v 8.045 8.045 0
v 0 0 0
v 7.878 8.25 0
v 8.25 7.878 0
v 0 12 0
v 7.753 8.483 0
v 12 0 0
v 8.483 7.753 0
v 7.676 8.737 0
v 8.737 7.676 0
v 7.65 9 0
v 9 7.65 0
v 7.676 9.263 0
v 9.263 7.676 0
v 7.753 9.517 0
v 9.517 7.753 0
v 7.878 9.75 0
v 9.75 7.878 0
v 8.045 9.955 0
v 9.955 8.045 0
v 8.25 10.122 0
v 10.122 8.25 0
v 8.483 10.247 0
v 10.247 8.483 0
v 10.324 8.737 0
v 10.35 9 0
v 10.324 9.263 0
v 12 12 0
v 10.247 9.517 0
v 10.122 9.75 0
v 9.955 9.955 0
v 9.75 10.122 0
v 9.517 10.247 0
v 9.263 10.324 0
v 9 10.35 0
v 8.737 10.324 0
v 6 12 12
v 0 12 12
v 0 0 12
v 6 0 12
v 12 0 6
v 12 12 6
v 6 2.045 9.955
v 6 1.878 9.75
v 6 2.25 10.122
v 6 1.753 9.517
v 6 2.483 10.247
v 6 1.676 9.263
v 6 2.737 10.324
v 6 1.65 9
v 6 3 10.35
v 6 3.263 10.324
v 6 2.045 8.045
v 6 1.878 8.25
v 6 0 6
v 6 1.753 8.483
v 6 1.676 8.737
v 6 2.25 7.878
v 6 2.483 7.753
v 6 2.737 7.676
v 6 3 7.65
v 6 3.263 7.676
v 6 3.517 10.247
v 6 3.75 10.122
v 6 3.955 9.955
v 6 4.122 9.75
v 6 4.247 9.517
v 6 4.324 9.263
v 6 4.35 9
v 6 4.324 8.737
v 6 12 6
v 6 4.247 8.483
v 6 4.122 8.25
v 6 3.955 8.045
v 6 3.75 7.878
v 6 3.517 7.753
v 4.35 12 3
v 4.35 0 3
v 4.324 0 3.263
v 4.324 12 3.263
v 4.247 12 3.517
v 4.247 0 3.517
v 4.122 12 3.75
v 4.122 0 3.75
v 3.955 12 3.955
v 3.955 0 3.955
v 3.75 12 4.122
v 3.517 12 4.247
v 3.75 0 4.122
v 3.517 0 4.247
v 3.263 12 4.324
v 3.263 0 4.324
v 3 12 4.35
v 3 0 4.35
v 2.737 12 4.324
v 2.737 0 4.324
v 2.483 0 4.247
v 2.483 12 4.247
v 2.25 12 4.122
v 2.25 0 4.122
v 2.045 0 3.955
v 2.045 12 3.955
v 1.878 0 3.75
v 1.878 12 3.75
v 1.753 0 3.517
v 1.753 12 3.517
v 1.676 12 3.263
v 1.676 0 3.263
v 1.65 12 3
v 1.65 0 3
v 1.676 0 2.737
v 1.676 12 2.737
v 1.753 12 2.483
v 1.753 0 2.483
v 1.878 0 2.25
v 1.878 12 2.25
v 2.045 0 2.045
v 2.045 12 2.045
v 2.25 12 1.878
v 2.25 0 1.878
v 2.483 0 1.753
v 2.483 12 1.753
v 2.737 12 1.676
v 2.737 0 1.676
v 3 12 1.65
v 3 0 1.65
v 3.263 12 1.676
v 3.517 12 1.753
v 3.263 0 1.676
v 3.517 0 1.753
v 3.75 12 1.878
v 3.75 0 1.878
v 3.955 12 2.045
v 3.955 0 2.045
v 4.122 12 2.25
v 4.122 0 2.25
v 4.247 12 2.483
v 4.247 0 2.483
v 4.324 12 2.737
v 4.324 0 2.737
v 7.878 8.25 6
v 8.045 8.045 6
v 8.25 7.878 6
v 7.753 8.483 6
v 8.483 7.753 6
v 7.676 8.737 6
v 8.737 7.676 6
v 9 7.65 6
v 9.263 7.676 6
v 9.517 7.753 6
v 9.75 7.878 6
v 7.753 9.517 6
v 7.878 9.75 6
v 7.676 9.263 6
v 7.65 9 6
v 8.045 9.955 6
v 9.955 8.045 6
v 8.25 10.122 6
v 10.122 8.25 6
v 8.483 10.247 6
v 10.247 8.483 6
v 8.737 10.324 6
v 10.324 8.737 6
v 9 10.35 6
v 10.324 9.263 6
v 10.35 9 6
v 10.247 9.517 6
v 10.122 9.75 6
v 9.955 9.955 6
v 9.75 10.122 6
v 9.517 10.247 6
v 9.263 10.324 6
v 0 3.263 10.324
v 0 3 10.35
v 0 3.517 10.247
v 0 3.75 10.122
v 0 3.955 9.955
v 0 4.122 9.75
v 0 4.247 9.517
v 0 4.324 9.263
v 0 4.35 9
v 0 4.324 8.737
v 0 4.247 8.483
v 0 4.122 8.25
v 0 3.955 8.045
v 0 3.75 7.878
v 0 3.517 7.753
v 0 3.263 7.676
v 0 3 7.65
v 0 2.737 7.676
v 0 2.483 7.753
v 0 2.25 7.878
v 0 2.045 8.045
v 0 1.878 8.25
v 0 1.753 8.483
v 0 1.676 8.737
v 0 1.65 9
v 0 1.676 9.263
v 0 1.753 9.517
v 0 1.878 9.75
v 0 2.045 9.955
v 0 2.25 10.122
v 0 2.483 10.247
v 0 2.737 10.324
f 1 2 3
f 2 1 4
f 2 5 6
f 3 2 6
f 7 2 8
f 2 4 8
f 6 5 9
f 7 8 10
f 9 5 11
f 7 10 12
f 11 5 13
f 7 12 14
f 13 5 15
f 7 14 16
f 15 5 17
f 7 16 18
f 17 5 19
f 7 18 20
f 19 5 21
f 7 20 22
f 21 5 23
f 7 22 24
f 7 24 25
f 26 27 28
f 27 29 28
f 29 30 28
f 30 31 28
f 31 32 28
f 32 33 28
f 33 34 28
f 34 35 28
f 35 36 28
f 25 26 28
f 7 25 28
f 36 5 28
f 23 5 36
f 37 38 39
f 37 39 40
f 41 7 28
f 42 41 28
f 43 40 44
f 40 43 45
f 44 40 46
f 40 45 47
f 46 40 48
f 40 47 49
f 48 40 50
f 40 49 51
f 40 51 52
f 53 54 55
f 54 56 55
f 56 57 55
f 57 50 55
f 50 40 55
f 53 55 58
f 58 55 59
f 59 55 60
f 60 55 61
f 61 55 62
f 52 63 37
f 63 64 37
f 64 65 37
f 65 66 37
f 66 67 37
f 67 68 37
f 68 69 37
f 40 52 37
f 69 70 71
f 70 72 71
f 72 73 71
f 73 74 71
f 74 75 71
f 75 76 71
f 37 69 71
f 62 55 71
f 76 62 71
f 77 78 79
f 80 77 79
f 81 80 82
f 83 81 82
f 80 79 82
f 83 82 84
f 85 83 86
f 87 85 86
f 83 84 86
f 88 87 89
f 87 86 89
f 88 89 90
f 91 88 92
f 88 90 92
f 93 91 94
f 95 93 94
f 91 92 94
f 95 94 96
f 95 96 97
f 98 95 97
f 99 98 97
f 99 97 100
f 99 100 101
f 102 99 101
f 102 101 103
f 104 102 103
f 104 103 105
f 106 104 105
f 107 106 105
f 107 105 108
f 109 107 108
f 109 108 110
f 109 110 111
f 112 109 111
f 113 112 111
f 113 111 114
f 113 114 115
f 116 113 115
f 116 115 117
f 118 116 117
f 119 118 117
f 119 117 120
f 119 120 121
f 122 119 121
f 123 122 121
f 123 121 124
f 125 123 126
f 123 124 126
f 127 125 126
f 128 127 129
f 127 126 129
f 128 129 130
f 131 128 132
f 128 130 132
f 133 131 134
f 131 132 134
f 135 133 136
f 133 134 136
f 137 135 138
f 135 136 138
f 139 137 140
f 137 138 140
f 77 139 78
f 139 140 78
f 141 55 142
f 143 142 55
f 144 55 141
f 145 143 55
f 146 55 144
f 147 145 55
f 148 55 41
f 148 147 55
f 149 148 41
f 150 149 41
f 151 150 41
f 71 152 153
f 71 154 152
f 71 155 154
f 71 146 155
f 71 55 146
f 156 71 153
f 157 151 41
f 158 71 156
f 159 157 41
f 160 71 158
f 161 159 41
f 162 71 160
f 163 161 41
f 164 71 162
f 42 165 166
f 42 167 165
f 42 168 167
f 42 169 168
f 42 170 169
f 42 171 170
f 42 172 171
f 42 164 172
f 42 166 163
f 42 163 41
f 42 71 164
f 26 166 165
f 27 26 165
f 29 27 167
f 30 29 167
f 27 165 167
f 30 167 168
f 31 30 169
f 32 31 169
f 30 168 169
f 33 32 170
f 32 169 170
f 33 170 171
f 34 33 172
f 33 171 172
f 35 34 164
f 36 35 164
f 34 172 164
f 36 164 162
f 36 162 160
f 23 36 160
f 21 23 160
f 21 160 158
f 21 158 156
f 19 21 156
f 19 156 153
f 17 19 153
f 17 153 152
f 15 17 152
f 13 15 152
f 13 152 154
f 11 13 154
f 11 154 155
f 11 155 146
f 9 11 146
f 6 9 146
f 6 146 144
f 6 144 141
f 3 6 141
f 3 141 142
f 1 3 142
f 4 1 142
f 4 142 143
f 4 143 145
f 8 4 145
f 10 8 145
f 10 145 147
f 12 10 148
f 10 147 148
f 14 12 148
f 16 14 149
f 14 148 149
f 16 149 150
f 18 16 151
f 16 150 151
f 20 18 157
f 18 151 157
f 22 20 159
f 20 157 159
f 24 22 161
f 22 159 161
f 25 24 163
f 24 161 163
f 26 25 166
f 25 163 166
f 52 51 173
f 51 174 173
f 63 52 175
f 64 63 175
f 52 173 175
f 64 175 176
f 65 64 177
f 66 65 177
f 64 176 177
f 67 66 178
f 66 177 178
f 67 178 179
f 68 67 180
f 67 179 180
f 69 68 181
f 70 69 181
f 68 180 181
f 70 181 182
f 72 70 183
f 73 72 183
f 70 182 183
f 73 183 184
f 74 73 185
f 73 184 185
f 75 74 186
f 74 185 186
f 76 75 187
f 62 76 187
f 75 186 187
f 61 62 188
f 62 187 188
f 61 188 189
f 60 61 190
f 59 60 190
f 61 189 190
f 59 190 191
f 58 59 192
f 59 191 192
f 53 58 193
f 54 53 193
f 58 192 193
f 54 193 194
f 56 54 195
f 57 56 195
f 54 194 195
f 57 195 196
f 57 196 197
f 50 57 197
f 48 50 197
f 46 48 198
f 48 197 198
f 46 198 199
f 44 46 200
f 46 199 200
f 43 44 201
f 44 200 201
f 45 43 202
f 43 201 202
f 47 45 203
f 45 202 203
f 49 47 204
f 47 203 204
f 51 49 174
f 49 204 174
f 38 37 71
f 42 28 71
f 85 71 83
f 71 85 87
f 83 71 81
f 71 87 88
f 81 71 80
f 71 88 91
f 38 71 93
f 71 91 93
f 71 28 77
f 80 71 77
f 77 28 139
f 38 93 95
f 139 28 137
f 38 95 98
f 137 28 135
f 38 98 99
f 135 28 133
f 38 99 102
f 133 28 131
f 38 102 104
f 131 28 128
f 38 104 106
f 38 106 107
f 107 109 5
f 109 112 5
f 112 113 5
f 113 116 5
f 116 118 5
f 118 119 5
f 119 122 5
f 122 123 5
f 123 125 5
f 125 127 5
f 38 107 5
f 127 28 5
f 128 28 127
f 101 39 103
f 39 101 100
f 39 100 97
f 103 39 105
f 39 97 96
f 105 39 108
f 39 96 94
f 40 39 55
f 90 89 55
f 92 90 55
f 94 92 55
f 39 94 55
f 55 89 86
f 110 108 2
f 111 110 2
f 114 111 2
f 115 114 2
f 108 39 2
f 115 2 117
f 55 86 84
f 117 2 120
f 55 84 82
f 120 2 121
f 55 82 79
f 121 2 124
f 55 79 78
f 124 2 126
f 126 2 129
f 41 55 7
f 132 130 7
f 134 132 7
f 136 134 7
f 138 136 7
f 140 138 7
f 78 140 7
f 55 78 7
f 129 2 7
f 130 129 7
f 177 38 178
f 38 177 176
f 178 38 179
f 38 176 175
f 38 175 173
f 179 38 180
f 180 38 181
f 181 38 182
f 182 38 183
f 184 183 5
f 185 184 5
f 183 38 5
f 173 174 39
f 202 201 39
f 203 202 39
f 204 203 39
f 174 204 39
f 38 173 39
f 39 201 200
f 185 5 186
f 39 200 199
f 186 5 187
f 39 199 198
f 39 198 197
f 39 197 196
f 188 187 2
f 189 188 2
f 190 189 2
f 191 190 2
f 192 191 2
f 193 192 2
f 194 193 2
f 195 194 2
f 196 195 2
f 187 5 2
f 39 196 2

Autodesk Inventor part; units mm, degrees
ref_plane "YZ Plane" through (0, 0, 0) normal (1, 0, 0) x (0, 1, 0)
ref_plane "XZ Plane" through (0, 0, 0) normal (0, 1, 0) x (-1, 0, 0)
ref_plane "XY Plane" through (0, 0, 0) normal (0, 0, 1) x (1, 0, 0)
sketch "스케치1" plane through (0, 0, 0) normal (0, 0, 1) x (1, 0, 0)
  line L0 (0, 0) -> (12, 0)
  line L1 (12, 0) -> (12, 12)
  line L2 (12, 12) -> (0, 12)
  line L3 (0, 12) -> (0, 0)
  dimension "d0" = 12
  dimension "d1" = 12
extrude "돌출1" add sketch "스케치1" along normal blind 6
sketch "스케치2" plane through (0, 0, 6) normal (0, 0, 1) x (1, 0, 0)
  line L0 (12, 12) -> (0, 12) projected
  line L1 (0, 0) -> (6, 0)
  line L2 (6, 0) -> (6, 12)
  line L3 (6, 12) -> (0, 12)
  line L4 (0, 12) -> (0, 0)
extrude "돌출2" add sketch "스케치2" along normal blind 6
sketch "스케치3" plane through (0, 0, 0) normal (0, -1, 0) x (1, 0, 0)
  line L0 (12, 6) -> (6, 6) projected
  line L1 (6, 6) -> (0, 6)
  line L2 (0, 6) -> (0, 0)
  line L3 (0, 0) -> (6, 0)
  line L4 (6, 0) -> (6, 6)
  circle A0 centre (3, 3) radius 1.35
  dimension "d6" = 2.7
extrude "돌출3" cut sketch "스케치3" against normal up to next contours A0
sketch "스케치4" plane through (0, 0, 0) normal (-1, 0, 0) x (0, 0, 1)
  line L0 (0, 0) -> (12, 0) projected
  line L1 (12, 0) -> (6, 0)
  line L2 (6, 0) -> (6, 6)
  line L3 (6, 6) -> (12, 6)
  line L4 (12, 6) -> (12, 0)
  circle A0 centre (9, 3) radius 1.35
  dimension "d9" = 2.7
extrude "돌출4" cut sketch "스케치4" against normal up to next contours A0
sketch "스케치5" plane through (0, 0, 6) normal (0, 0, 1) x (1, 0, 0)
  line L0 (12, 0) -> (12, 12) projected
  line L1 (12, 12) -> (6, 12)
  line L2 (6, 12) -> (6, 6)
  line L3 (6, 6) -> (12, 6)
  line L4 (12, 6) -> (12, 12)
  circle A0 centre (9, 9) radius 1.35
  point P0 (0, 0)
  dimension "d12" = 2.7
extrude "돌출5" cut sketch "스케치5" against normal up to next contours A0
properties part number "부품81"
